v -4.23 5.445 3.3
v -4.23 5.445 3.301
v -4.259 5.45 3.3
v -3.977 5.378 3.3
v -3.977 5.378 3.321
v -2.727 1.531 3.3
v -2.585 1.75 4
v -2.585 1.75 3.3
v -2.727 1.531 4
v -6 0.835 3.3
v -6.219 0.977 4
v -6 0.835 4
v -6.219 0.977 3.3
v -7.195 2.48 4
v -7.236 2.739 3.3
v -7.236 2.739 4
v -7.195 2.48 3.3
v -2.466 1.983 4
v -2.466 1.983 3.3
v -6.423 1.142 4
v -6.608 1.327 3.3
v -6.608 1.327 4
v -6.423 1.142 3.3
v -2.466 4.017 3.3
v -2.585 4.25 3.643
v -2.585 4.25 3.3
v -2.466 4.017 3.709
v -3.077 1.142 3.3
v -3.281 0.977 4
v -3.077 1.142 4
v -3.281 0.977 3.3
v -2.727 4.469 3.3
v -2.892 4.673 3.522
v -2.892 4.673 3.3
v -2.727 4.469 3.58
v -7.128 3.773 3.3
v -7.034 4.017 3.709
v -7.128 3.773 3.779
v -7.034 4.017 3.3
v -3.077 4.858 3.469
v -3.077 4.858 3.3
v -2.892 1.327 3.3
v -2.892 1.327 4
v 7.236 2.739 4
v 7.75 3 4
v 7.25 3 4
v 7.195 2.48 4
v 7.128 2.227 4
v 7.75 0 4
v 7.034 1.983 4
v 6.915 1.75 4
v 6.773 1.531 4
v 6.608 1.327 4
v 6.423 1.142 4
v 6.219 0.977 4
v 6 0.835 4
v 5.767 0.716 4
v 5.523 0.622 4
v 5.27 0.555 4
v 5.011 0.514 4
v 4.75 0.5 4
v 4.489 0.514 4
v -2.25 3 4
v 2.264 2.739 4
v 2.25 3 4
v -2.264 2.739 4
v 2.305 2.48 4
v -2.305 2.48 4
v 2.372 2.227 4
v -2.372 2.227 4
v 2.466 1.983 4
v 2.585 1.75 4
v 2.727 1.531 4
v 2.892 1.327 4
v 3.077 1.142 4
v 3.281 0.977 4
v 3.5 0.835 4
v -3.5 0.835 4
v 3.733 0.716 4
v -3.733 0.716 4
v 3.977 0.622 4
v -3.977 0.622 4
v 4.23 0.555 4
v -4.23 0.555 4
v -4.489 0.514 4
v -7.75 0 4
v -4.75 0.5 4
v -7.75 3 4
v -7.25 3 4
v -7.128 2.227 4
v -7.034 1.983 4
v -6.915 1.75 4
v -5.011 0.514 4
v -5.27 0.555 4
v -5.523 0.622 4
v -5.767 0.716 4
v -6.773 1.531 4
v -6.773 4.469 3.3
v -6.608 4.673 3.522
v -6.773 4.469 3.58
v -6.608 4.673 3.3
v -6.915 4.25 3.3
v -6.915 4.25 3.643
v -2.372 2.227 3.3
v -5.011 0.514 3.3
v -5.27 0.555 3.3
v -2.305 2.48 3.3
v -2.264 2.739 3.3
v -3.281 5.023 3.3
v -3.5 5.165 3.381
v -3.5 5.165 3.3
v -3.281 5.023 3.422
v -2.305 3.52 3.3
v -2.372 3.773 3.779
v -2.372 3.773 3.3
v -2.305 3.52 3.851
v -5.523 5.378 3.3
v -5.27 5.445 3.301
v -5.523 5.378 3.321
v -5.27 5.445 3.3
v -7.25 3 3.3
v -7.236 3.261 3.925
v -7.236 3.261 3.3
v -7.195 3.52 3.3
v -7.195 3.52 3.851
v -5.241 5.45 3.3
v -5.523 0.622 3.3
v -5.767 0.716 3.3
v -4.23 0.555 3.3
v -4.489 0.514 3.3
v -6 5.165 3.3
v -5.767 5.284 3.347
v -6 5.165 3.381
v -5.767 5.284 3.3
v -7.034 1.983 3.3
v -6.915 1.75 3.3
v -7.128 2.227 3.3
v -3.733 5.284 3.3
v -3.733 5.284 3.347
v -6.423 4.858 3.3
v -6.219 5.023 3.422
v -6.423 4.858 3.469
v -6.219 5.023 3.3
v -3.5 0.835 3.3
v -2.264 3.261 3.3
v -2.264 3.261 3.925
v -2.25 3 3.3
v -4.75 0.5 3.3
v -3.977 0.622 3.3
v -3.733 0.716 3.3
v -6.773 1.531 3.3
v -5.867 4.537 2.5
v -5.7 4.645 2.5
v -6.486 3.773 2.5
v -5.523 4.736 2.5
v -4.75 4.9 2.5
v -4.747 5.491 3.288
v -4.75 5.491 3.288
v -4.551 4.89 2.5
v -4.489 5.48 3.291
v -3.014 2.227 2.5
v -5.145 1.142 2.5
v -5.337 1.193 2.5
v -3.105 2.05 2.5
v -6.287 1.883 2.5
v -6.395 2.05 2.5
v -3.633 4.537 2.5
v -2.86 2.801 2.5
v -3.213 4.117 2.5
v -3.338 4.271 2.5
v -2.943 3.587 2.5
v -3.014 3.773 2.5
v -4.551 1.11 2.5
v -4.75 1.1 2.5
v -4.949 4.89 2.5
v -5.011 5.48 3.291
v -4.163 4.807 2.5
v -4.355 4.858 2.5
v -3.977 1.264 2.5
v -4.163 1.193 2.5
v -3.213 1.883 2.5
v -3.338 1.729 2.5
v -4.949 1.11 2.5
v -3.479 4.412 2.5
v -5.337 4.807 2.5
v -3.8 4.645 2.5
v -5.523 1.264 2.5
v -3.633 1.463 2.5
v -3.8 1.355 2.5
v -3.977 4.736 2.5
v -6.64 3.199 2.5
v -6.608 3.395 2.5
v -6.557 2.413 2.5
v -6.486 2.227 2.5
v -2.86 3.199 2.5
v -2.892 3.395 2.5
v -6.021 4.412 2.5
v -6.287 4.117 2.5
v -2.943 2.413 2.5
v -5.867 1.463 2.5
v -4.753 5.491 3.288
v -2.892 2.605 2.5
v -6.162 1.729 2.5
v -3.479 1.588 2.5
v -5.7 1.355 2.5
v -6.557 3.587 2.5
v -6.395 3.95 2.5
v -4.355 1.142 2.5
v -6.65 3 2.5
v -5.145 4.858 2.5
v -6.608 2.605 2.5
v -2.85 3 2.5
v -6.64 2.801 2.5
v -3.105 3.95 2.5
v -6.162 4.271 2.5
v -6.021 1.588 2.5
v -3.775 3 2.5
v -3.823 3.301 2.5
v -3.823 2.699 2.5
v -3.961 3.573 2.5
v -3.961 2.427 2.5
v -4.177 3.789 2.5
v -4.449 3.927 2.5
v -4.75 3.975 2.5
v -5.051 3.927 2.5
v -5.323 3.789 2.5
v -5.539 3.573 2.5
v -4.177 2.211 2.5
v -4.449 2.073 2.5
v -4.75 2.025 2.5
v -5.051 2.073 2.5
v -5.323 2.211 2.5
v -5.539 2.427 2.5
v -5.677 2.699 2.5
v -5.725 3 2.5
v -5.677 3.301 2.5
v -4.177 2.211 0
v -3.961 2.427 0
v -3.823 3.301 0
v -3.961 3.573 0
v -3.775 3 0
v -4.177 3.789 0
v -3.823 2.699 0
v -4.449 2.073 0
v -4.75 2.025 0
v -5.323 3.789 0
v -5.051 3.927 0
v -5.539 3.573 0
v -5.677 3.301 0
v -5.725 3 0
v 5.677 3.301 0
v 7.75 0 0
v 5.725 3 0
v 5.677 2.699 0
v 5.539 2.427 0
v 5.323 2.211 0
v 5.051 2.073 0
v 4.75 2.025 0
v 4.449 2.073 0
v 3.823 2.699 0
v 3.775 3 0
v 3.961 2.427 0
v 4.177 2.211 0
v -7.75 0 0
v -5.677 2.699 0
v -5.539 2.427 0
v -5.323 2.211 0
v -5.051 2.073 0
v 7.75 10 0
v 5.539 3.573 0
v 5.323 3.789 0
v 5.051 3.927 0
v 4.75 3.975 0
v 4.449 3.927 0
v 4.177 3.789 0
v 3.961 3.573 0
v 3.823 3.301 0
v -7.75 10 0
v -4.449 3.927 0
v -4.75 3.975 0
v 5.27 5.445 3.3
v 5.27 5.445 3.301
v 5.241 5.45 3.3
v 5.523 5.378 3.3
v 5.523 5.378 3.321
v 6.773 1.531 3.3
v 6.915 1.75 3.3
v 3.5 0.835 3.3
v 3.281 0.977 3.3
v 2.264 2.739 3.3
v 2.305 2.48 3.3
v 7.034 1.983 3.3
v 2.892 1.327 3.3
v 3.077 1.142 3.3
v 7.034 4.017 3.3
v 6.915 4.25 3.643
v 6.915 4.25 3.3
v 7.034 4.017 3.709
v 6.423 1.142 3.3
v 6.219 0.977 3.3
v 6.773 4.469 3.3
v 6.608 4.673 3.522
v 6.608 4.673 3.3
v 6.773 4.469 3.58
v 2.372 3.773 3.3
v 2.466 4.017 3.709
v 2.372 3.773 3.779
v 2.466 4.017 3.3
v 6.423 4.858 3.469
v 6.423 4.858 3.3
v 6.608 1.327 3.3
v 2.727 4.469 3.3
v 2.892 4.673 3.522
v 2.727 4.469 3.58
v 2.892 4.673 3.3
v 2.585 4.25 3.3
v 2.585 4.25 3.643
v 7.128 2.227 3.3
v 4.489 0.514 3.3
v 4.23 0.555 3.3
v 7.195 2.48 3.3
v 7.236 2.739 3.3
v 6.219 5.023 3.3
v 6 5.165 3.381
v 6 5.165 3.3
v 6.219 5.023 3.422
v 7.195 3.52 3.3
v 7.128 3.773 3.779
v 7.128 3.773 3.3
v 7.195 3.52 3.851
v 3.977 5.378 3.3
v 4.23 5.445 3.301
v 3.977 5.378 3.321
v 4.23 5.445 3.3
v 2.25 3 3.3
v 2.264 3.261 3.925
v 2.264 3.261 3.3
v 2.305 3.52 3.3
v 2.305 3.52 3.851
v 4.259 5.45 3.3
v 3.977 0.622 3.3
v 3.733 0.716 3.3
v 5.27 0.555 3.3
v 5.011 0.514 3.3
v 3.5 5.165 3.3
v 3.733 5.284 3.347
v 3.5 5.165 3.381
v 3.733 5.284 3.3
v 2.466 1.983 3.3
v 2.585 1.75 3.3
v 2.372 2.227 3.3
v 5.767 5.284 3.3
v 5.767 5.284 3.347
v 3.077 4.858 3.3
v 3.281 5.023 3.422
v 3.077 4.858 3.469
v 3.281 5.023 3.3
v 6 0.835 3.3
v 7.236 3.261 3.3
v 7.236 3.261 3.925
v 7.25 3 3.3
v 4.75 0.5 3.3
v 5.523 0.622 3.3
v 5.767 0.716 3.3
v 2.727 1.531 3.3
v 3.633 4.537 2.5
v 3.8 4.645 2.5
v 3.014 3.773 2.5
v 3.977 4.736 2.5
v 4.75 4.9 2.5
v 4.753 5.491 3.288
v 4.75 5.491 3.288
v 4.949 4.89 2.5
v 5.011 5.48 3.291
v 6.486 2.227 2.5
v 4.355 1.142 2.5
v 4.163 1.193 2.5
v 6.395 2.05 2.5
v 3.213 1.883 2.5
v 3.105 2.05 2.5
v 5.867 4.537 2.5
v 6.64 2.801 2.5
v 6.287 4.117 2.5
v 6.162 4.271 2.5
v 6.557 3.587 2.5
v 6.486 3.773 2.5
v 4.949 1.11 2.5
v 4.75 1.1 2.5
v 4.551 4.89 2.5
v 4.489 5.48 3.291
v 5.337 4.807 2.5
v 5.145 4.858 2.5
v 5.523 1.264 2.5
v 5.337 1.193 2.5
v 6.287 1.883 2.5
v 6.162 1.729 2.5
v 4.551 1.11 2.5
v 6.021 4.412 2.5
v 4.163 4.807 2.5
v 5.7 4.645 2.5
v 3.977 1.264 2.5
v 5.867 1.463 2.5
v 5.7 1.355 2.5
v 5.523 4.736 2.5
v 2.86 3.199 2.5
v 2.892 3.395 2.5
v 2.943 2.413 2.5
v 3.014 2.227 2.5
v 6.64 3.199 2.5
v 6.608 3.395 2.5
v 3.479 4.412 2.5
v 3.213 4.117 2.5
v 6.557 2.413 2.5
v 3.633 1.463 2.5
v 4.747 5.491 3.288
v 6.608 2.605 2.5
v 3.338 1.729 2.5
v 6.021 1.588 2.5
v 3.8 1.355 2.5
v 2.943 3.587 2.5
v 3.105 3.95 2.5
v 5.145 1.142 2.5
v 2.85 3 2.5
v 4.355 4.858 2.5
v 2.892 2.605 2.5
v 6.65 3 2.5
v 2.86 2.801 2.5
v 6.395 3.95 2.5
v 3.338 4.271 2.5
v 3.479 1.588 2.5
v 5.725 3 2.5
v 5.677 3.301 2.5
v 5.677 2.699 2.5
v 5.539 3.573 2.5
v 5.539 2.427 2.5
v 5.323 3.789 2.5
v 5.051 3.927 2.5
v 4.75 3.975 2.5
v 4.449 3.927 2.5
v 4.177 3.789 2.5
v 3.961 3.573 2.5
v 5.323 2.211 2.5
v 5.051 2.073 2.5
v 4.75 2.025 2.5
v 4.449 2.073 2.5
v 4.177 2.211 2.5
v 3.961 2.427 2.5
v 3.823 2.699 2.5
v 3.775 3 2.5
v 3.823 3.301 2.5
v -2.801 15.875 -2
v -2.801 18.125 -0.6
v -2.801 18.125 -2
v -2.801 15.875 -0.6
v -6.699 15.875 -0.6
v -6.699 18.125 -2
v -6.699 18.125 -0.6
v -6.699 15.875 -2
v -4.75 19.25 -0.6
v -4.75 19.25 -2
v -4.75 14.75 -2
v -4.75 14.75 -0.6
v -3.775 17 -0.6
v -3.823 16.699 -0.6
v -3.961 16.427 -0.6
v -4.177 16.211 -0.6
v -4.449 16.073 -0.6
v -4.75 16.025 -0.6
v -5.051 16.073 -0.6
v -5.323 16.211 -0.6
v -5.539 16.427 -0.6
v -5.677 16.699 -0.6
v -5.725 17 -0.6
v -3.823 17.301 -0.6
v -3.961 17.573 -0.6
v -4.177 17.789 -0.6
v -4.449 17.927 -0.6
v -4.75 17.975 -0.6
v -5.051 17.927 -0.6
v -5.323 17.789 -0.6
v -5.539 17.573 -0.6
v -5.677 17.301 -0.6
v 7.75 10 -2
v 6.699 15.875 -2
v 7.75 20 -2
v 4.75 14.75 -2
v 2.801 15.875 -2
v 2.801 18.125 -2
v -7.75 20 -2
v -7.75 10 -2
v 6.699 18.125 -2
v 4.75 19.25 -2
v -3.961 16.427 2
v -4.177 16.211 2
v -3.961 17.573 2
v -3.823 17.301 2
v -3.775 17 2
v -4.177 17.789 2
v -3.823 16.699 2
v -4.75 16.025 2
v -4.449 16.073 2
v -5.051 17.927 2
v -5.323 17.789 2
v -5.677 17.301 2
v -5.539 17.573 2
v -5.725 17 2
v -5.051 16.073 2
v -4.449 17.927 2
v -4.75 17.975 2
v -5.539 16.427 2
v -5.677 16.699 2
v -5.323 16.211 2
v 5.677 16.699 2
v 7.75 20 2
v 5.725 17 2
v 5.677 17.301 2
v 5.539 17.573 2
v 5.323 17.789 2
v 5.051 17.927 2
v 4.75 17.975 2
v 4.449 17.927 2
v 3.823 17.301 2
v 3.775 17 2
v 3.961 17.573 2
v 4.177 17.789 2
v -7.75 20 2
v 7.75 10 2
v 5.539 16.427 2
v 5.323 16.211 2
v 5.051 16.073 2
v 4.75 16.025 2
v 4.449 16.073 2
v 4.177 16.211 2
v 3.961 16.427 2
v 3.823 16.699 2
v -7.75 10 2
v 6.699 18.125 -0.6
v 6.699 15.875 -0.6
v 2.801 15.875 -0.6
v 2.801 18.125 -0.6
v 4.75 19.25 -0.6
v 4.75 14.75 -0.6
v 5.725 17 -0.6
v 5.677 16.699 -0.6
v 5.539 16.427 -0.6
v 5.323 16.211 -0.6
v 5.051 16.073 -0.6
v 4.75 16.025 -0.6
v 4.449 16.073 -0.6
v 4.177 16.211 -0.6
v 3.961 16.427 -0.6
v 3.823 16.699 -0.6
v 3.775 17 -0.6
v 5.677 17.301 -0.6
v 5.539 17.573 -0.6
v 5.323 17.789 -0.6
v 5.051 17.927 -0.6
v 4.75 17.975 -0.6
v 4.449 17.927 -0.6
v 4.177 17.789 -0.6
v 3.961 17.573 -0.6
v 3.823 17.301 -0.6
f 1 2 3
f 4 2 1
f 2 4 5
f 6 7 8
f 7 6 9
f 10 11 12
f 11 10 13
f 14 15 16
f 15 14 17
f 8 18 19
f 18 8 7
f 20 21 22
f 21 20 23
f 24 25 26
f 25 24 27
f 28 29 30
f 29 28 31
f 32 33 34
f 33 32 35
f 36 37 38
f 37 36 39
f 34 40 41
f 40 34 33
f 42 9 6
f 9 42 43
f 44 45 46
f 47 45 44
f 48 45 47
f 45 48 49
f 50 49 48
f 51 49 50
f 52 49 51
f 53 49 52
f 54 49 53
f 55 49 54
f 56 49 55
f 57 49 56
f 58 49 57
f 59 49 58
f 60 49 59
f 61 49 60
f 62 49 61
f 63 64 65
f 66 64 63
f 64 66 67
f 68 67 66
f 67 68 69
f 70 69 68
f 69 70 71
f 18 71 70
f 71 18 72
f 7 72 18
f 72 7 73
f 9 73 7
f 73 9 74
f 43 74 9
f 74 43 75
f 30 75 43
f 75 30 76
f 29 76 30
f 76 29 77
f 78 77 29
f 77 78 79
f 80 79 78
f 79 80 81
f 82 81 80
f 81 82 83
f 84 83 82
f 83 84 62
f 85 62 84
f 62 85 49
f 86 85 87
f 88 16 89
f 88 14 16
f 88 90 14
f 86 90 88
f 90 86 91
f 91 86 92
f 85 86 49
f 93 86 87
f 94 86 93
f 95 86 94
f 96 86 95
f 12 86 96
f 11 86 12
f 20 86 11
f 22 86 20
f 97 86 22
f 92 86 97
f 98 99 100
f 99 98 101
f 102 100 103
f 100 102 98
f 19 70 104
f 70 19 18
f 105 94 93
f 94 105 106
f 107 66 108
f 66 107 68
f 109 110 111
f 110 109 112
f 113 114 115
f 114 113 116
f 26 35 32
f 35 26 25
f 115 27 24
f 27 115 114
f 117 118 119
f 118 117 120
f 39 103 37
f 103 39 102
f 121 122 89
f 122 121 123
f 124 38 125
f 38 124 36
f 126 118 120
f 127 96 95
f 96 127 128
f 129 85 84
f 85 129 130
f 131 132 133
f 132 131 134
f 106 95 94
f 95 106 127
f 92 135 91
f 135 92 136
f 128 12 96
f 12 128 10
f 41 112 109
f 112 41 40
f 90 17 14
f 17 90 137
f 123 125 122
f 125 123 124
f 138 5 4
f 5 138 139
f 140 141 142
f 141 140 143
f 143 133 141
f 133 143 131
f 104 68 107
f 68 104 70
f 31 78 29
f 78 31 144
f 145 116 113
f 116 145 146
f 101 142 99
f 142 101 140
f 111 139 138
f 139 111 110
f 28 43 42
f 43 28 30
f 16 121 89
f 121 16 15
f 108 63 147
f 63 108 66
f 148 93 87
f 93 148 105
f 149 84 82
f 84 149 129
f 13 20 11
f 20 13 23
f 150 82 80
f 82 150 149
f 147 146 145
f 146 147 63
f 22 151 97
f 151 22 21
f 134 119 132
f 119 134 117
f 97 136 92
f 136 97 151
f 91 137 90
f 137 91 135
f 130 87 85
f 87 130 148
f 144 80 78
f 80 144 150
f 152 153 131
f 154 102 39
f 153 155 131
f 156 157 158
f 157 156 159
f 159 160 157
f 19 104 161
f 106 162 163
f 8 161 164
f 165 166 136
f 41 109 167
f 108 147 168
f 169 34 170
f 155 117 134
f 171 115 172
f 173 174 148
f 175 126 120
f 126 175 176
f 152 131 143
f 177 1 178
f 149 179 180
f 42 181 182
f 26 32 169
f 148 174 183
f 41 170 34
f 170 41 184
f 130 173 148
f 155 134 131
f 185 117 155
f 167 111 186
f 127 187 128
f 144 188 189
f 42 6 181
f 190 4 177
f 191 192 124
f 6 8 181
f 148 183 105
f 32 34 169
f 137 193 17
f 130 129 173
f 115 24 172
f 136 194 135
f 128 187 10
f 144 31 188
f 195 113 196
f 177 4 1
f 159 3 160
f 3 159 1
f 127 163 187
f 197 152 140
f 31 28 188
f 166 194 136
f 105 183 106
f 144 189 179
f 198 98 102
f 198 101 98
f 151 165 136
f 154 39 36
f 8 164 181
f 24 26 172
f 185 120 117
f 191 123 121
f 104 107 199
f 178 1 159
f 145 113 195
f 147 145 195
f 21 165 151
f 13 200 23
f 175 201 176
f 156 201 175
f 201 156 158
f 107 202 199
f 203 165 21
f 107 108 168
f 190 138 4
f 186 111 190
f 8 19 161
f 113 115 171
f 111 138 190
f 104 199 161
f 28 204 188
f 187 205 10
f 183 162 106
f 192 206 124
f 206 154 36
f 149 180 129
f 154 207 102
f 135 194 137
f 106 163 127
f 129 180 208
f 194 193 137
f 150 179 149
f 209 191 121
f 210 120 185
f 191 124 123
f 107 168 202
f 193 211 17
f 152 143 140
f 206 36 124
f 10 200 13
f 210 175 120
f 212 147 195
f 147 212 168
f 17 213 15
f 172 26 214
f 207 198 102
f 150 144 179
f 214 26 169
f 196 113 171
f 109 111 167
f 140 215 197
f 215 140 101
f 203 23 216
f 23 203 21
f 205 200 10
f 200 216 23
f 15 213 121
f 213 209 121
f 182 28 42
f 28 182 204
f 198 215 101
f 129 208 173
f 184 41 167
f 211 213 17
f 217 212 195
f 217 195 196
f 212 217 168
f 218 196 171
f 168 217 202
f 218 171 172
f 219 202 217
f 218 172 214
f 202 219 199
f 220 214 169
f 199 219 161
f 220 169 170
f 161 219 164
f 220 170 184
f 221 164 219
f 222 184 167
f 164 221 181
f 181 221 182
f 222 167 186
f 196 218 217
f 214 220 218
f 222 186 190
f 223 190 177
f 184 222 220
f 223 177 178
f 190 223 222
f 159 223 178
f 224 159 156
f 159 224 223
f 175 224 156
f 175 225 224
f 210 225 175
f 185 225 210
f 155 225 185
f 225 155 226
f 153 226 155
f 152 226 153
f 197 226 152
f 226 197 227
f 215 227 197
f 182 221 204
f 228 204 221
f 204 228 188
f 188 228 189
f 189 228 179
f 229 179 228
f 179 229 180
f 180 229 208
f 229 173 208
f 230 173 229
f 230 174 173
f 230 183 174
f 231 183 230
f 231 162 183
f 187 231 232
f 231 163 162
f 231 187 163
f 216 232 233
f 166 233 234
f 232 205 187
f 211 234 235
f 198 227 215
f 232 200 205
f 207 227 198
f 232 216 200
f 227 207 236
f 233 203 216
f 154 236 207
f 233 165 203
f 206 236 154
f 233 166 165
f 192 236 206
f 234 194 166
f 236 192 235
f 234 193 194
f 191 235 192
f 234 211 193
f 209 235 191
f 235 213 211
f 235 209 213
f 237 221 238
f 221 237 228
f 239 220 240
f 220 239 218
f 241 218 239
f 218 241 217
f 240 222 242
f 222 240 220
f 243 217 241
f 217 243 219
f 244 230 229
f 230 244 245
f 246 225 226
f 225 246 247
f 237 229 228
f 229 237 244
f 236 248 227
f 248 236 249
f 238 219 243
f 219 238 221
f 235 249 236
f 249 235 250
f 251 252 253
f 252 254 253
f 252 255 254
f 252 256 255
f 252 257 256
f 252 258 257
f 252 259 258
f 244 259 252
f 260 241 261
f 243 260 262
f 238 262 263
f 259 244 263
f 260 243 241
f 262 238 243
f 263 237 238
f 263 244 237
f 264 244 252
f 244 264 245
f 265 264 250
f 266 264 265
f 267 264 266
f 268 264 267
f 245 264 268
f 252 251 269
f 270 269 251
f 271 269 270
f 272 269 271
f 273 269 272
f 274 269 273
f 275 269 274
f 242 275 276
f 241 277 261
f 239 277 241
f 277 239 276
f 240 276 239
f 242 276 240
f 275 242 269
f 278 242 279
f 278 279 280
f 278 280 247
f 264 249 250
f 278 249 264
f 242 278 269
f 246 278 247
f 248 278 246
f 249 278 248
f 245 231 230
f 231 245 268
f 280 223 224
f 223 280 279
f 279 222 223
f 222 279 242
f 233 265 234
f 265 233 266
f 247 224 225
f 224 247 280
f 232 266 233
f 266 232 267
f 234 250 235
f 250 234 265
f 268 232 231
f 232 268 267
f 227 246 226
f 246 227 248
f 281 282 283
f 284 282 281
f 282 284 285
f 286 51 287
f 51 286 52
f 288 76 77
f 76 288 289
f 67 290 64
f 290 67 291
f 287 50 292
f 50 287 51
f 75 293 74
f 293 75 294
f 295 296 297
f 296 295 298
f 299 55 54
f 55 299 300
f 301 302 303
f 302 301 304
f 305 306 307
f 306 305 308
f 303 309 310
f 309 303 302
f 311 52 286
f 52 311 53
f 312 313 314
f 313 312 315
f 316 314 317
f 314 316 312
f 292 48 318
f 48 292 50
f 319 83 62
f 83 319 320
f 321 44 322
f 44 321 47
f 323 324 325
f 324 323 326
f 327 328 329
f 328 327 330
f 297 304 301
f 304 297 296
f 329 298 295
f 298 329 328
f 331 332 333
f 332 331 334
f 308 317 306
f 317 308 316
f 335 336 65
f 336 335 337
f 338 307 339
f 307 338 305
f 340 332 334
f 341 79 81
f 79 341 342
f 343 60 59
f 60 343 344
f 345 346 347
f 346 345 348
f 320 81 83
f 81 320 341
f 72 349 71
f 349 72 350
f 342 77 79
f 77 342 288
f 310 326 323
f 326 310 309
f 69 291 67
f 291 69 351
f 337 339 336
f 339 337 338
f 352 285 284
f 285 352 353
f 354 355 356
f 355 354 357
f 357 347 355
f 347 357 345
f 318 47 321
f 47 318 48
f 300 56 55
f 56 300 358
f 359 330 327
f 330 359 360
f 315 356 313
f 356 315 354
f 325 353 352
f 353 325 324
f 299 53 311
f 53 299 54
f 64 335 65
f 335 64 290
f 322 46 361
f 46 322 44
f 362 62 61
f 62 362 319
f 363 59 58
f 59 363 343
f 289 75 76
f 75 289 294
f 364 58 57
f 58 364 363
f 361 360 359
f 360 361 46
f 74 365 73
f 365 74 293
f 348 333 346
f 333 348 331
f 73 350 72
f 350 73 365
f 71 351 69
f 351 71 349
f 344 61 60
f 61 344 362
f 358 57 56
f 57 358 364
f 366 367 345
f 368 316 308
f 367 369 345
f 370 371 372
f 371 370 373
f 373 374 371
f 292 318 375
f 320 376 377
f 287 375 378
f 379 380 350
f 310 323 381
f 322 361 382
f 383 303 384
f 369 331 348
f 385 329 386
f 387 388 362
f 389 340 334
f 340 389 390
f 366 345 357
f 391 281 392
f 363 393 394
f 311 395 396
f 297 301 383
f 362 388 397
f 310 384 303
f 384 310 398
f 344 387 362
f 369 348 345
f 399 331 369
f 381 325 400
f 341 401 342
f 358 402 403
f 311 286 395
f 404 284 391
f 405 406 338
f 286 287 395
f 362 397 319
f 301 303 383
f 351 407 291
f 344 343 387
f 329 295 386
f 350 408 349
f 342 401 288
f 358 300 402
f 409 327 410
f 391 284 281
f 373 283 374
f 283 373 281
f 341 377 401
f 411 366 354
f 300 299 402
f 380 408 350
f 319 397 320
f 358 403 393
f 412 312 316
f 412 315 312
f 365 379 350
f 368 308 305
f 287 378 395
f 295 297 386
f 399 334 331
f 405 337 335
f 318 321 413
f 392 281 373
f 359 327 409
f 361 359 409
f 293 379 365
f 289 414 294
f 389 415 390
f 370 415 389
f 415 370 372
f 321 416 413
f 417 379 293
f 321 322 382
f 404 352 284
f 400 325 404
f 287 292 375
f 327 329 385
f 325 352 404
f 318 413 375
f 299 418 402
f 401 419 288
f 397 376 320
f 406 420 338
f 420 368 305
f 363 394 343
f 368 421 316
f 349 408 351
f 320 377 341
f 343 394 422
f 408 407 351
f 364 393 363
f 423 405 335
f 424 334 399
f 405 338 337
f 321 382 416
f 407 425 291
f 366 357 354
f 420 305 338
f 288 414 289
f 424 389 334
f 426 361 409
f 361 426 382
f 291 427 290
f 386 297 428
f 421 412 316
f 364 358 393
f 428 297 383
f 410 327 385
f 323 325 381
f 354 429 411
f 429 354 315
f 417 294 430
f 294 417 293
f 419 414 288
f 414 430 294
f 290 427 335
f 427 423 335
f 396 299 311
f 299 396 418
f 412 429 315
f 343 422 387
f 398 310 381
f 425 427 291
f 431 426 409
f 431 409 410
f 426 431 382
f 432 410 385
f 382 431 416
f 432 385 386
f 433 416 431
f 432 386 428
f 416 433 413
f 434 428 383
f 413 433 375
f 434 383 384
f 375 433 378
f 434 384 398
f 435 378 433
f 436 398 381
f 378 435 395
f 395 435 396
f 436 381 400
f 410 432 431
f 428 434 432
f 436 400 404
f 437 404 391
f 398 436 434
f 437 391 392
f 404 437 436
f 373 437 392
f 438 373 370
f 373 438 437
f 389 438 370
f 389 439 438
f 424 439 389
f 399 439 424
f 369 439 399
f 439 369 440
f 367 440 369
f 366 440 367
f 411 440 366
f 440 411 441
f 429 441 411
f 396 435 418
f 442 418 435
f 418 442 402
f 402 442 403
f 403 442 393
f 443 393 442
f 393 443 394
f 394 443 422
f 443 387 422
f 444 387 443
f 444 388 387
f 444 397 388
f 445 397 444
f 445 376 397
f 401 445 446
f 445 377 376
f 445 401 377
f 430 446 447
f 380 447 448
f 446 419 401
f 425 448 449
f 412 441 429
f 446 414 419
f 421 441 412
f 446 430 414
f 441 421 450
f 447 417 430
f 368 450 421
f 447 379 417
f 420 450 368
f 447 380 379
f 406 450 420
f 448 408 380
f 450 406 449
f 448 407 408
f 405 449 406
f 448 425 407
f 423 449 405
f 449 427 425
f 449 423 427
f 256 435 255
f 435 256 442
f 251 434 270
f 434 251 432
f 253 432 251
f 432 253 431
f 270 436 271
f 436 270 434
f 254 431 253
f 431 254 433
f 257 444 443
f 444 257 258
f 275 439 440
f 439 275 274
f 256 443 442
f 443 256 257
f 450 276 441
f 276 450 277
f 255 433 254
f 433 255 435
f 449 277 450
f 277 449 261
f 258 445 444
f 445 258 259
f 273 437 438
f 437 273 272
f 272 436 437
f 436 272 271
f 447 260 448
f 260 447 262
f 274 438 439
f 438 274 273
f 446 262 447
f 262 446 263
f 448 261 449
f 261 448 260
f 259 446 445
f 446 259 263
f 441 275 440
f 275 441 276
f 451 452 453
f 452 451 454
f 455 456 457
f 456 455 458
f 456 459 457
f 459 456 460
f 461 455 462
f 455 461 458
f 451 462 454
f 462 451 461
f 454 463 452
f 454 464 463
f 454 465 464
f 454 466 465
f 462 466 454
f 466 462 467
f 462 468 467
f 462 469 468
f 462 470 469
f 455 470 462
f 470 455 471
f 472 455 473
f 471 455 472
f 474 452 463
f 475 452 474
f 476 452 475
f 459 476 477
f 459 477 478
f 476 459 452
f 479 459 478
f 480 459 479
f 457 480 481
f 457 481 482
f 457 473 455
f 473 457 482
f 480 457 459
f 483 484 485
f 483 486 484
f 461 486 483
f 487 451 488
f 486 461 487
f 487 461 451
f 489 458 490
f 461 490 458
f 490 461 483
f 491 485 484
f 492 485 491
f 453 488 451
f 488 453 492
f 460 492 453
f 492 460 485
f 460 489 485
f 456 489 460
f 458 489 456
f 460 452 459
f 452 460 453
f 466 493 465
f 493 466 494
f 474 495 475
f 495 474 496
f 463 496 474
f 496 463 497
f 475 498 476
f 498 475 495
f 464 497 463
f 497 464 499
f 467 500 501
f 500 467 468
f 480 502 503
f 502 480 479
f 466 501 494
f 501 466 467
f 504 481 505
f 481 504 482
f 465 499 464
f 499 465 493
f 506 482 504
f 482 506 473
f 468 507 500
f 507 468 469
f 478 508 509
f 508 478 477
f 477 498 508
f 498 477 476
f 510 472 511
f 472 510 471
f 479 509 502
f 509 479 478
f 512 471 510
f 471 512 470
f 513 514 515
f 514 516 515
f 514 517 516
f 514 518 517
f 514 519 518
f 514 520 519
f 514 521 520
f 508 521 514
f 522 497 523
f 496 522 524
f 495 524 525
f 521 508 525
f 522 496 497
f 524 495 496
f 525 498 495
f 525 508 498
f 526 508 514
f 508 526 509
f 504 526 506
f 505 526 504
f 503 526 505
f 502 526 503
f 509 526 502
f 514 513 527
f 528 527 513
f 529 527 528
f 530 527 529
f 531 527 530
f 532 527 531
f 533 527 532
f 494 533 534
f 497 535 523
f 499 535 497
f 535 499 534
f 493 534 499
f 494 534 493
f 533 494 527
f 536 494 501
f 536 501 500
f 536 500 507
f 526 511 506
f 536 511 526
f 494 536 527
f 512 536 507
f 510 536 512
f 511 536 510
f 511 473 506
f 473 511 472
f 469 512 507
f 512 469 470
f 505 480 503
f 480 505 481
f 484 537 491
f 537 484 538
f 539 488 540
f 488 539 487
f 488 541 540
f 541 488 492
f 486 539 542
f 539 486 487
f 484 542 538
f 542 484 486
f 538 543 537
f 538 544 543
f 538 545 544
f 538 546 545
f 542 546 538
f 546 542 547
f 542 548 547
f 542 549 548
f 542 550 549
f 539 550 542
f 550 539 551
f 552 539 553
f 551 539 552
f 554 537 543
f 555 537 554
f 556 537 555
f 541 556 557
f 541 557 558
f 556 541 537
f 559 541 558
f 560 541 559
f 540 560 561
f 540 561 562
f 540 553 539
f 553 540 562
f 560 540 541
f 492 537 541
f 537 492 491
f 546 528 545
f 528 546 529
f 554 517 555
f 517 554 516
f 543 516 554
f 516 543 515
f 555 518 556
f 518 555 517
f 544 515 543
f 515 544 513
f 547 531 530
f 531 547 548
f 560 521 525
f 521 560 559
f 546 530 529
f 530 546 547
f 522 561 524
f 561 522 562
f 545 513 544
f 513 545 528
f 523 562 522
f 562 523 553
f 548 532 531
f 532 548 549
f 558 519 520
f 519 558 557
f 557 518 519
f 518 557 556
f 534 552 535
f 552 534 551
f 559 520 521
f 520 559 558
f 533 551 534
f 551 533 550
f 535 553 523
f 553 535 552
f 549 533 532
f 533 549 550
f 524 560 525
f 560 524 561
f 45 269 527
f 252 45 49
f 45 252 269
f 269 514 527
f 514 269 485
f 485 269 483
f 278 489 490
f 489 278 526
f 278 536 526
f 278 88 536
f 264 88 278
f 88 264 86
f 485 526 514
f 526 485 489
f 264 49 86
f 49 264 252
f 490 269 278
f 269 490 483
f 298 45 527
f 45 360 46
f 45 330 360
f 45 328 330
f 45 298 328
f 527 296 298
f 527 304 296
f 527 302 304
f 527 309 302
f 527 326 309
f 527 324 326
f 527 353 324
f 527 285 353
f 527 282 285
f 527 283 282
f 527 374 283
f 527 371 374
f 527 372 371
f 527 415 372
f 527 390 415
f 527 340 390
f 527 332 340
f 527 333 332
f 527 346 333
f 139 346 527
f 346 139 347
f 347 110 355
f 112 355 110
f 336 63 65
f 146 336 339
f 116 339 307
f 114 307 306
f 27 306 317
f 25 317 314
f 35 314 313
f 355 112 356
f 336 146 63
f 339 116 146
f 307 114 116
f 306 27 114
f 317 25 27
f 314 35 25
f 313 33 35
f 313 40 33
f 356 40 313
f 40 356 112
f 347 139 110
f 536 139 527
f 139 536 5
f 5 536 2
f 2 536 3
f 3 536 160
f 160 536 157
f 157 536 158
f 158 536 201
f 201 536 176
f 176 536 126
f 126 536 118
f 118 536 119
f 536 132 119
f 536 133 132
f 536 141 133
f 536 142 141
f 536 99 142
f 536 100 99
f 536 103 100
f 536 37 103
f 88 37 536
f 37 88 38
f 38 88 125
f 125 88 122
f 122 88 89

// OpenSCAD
include <../libs/hardware-recess.scad>;

endstop_offset=20;
extra_width = 6;

module endstop_mount(){
    translate([-4.75,0,0])hole_w_end(4, 1.4, "round", M2);
    // Front screw hole for endstop
    translate([4.75,0,0])hole_w_end(4, 1.4, "round", M2);
}

module endstop_nut(){
    translate([-4.75,0,-2])hole_w_end(4, 1.4, "hex", M2, flip=true);
    // Front screw hole for endstop
    translate([4.75,0,-2])hole_w_end(4, 1.4, "hex", M2, flip=true);
}


difference(){
    translate([-4.75 - extra_width/2, 0, -2]) 
        cube([4.75*2 + extra_width , endstop_offset, 6]);
    translate([-4.75 - extra_width/2, 0, -2]) 
            cube([4.75*2 + extra_width , endstop_offset/2, 2]);
    hull(){
        translate([-4.75 - extra_width/2, endstop_offset /2, 2]) 
            cube([4.75*2 + extra_width , endstop_offset, 2]);
        translate([-4.75 - extra_width/2, 3, 4]) 
            cube([4.75*2 + extra_width , endstop_offset, 0.5]);
    }
    
    translate([0, 3, 0])
        endstop_mount();
    translate([0, endstop_offset - 3, 0])
        endstop_nut();
}
